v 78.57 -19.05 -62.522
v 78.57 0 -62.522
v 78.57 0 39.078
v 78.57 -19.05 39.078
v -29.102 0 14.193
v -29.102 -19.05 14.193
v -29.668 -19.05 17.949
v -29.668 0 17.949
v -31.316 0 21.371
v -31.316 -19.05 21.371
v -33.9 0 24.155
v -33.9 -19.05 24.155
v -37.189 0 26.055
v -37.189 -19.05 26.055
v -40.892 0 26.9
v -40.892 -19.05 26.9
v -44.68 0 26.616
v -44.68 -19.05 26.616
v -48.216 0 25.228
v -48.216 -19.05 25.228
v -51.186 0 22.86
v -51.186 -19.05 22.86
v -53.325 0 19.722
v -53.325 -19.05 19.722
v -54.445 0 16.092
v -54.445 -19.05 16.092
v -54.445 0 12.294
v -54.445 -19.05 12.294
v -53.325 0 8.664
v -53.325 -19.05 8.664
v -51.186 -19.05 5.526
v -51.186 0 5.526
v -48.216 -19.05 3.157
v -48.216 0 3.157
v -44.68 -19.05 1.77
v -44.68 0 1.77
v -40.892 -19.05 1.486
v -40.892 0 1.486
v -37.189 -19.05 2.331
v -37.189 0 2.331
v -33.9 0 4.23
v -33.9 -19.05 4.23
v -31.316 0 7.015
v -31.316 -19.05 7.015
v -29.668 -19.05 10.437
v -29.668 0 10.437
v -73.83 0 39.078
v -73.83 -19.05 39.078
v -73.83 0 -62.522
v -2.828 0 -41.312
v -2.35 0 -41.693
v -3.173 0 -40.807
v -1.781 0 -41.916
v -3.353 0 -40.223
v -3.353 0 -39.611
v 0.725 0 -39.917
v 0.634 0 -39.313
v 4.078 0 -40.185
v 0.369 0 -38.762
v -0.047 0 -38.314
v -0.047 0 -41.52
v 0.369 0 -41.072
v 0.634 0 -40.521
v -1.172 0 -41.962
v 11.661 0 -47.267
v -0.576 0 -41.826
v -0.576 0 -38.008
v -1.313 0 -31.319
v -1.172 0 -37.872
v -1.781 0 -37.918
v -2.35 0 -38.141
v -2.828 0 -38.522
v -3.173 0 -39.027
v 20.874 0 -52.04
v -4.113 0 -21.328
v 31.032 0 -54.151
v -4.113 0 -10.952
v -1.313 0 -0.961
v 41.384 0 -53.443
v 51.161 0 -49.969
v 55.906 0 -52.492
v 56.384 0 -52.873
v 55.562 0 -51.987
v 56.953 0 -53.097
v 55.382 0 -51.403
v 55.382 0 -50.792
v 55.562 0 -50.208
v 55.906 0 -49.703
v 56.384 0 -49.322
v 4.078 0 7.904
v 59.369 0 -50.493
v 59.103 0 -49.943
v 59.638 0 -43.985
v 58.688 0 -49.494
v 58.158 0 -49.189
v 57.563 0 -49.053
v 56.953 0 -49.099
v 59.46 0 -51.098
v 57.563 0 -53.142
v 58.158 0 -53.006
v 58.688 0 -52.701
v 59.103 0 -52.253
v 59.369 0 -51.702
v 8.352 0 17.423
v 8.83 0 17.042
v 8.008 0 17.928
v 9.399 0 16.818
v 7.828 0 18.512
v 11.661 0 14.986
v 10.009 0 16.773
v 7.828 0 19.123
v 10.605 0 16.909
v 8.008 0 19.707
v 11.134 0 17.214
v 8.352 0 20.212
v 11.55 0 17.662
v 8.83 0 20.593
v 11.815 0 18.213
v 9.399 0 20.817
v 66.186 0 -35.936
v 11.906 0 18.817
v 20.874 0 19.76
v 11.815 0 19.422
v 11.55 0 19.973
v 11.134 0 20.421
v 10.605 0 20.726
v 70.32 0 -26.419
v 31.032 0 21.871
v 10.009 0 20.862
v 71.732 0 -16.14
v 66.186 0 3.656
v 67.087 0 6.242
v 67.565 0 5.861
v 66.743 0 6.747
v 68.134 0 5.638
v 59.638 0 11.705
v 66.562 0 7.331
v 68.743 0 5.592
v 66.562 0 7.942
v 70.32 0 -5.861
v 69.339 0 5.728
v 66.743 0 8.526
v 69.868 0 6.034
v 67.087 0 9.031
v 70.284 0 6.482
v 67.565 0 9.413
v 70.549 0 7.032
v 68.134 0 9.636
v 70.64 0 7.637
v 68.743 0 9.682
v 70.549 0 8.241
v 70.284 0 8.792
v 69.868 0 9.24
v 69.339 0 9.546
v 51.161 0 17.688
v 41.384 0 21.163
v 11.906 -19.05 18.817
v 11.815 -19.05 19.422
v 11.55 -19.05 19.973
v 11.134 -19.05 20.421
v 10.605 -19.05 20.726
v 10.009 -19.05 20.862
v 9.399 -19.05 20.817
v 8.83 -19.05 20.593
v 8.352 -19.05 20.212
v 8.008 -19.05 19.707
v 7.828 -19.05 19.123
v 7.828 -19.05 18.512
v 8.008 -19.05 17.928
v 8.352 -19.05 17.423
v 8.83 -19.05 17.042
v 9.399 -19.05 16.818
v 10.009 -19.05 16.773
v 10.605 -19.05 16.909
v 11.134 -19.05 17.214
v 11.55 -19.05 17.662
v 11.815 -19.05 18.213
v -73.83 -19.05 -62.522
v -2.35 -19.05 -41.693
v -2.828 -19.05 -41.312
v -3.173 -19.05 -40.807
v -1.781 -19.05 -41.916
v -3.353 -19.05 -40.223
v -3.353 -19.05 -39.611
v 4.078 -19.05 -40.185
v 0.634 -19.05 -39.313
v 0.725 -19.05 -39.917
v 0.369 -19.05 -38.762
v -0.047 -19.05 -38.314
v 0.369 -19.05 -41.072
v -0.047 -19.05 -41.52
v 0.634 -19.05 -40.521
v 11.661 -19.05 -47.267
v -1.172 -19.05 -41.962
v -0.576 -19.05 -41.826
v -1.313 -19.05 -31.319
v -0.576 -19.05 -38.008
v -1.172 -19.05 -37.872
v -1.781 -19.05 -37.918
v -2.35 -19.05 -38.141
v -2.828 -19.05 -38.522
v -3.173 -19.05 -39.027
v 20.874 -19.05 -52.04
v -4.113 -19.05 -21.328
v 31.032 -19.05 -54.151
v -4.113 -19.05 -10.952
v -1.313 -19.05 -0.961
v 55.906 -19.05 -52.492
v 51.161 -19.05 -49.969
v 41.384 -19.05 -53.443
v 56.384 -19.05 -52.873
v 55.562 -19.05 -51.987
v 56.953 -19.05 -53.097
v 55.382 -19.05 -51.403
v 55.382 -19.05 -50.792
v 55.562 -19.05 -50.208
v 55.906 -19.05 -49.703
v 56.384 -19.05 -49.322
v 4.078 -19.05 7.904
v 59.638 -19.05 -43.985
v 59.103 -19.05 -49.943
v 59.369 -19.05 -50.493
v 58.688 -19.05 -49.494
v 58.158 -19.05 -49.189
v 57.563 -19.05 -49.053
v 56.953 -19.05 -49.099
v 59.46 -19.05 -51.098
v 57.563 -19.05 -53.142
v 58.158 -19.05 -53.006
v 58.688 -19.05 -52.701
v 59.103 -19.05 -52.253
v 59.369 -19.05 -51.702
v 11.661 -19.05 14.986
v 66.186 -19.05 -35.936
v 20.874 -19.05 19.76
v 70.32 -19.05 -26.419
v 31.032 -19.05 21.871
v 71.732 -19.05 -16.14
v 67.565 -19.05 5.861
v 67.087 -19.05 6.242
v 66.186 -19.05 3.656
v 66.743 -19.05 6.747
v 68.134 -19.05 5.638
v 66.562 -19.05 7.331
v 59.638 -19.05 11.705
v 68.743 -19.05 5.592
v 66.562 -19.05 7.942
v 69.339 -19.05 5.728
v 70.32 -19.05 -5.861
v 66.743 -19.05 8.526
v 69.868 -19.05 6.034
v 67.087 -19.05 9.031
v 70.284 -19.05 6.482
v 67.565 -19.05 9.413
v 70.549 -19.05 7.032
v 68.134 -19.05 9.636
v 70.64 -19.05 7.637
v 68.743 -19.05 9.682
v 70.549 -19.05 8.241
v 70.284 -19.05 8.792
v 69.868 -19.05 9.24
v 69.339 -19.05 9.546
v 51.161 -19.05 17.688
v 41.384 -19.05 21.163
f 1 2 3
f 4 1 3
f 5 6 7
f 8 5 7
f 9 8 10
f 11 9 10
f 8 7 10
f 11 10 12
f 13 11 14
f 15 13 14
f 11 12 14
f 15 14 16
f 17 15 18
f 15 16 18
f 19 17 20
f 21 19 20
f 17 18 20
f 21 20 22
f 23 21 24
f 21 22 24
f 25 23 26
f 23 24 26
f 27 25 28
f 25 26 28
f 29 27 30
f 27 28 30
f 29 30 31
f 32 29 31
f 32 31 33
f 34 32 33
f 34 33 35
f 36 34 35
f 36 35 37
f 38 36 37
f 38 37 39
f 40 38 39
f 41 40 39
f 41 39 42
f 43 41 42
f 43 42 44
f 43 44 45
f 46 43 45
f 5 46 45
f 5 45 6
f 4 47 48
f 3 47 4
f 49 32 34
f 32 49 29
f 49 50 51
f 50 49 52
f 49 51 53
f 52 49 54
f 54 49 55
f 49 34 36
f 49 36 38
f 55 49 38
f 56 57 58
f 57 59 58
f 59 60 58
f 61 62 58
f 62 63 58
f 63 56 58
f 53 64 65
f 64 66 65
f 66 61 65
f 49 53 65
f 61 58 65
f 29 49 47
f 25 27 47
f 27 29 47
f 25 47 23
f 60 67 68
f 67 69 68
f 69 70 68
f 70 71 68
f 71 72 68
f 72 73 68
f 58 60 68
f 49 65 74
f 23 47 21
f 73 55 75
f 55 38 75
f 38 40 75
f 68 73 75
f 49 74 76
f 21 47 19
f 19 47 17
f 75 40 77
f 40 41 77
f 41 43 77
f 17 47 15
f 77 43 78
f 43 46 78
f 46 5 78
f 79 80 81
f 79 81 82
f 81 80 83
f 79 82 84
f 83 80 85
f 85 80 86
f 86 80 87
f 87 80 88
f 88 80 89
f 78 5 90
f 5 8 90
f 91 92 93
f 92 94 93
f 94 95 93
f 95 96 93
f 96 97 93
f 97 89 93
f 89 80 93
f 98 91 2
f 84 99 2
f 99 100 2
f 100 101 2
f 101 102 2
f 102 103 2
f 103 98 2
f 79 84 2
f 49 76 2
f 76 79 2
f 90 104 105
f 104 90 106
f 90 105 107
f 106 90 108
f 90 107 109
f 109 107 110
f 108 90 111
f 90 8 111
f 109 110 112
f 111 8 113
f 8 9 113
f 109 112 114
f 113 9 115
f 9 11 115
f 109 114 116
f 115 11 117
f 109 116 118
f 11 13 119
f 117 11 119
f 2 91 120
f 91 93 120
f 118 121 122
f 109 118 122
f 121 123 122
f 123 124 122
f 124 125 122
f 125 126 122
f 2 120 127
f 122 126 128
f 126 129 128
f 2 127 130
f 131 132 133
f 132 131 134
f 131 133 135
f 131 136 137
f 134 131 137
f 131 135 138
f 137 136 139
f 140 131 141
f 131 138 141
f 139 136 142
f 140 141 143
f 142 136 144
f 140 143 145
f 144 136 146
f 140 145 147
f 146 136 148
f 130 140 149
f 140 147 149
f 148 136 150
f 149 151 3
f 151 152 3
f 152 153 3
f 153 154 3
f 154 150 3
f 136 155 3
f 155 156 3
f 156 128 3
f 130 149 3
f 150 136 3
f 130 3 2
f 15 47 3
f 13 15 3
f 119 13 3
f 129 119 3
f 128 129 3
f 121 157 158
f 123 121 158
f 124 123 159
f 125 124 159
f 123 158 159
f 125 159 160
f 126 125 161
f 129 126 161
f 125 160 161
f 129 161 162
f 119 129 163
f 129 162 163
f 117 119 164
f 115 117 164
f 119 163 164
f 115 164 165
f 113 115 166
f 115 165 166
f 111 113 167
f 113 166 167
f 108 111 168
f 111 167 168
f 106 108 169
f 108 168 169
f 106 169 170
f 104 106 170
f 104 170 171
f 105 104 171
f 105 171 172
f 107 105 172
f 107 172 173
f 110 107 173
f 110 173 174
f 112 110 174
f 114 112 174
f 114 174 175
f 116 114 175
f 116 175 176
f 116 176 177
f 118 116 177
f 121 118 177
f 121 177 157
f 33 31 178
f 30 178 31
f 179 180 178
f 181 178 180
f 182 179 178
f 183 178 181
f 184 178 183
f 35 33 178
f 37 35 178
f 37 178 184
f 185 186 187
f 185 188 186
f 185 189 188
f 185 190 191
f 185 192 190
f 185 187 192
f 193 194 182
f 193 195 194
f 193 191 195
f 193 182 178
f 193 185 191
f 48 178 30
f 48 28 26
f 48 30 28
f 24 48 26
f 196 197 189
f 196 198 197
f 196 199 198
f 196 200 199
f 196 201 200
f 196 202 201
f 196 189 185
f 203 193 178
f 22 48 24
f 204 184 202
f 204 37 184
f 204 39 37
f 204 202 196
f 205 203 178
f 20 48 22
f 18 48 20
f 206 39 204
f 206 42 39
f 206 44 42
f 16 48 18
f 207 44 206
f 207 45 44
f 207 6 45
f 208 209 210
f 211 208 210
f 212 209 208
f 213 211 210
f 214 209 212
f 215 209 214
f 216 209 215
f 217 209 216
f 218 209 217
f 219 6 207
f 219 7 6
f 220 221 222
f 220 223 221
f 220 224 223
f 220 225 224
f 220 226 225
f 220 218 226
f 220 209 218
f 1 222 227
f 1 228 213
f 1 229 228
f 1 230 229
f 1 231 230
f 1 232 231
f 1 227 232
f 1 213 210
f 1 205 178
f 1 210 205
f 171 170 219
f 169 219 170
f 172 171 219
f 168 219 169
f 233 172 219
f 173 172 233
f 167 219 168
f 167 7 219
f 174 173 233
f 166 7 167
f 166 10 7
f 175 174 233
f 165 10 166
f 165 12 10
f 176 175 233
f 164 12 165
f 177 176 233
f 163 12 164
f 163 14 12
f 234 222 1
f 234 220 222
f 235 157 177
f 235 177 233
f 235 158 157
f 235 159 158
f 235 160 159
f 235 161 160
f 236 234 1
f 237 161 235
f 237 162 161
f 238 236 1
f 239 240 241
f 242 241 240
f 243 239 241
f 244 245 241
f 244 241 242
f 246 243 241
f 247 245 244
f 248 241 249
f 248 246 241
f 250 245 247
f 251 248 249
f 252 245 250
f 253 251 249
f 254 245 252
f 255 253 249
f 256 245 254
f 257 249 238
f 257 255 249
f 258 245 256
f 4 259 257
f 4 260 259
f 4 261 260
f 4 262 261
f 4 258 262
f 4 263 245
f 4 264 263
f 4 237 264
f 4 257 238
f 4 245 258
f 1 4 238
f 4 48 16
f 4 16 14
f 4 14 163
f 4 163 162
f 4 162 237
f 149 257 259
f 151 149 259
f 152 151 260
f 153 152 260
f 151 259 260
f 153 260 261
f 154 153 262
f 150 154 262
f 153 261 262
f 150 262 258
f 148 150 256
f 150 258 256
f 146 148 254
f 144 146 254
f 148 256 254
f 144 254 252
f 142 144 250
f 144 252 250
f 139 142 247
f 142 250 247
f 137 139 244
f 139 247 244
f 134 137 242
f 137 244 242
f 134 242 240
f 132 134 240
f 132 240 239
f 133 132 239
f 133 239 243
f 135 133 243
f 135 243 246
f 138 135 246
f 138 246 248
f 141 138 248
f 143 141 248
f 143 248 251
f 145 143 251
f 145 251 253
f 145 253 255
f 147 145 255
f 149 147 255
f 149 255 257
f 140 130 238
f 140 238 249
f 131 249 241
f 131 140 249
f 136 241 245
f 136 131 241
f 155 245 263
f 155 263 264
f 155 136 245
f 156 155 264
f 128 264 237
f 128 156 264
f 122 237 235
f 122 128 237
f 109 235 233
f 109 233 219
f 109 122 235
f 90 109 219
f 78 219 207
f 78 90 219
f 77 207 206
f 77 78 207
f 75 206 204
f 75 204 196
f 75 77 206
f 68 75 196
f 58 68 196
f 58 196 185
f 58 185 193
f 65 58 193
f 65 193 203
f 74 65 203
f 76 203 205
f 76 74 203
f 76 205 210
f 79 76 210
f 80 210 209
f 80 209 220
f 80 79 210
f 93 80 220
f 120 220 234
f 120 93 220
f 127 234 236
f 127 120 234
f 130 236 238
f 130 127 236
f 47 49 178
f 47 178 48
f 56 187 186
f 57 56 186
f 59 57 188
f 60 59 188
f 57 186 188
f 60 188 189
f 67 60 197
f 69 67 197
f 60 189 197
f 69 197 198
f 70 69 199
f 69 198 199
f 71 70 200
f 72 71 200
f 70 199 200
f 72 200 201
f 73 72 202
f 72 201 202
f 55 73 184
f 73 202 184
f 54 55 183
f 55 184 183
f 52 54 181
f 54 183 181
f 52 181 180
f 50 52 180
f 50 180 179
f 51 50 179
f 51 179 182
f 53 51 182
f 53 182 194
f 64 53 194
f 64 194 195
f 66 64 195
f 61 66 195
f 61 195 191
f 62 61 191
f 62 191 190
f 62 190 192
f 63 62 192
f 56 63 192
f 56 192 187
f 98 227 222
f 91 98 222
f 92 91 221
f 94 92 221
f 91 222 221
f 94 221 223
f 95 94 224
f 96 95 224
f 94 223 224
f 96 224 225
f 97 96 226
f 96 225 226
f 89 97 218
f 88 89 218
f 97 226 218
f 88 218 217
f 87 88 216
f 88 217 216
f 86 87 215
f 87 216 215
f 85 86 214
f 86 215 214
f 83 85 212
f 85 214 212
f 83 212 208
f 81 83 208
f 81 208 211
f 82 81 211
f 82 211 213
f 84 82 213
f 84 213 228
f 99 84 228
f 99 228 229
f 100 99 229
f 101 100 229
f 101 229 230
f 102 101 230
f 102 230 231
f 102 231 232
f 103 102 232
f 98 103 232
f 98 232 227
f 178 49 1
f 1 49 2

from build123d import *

# Parameters (mm, degrees)
F0_W     = 152.4
F0_H     = 101.6
F0_R     = 38.1
F1_DEPTH = 19.05
F2_R     = 12.742658
F3_DEPTH = 25.4
F4_R     = 2.050488
F5_DEPTH = 25.4


with BuildPart() as f1:
    # F0 (on Front) → F1 (new body)
    with BuildSketch(Plane.XZ):
        with Locations((2.370438, -11.722004)):
            Rectangle(F0_W, F0_H)
        with Locations((33.632447, -16.140074)):
            Circle(F0_R, mode=Mode.SUBTRACT)
    extrude(amount=F1_DEPTH)

    # F2 (on face) → F3 (cut)
    with BuildSketch(Plane.XZ.offset(19.05)):
        with Locations((-41.844524, 14.192783)):
            Circle(F2_R)
    extrude(amount=-F3_DEPTH, mode=Mode.SUBTRACT)

    # F4 (on face) → F5 (cut)
    with BuildSketch(Plane.XZ.offset(19.05)):
        with Locations((9.855603, 18.817487)):
            Circle(F4_R)
        with Locations((-1.325114, -39.916918)):
            Circle(F4_R)
        with Locations((57.409292, -51.097635)):
            Circle(F4_R)
        with Locations((68.590008, 7.636771)):
            Circle(F4_R)
    extrude(amount=-F5_DEPTH, mode=Mode.SUBTRACT)


solid = f1.part
